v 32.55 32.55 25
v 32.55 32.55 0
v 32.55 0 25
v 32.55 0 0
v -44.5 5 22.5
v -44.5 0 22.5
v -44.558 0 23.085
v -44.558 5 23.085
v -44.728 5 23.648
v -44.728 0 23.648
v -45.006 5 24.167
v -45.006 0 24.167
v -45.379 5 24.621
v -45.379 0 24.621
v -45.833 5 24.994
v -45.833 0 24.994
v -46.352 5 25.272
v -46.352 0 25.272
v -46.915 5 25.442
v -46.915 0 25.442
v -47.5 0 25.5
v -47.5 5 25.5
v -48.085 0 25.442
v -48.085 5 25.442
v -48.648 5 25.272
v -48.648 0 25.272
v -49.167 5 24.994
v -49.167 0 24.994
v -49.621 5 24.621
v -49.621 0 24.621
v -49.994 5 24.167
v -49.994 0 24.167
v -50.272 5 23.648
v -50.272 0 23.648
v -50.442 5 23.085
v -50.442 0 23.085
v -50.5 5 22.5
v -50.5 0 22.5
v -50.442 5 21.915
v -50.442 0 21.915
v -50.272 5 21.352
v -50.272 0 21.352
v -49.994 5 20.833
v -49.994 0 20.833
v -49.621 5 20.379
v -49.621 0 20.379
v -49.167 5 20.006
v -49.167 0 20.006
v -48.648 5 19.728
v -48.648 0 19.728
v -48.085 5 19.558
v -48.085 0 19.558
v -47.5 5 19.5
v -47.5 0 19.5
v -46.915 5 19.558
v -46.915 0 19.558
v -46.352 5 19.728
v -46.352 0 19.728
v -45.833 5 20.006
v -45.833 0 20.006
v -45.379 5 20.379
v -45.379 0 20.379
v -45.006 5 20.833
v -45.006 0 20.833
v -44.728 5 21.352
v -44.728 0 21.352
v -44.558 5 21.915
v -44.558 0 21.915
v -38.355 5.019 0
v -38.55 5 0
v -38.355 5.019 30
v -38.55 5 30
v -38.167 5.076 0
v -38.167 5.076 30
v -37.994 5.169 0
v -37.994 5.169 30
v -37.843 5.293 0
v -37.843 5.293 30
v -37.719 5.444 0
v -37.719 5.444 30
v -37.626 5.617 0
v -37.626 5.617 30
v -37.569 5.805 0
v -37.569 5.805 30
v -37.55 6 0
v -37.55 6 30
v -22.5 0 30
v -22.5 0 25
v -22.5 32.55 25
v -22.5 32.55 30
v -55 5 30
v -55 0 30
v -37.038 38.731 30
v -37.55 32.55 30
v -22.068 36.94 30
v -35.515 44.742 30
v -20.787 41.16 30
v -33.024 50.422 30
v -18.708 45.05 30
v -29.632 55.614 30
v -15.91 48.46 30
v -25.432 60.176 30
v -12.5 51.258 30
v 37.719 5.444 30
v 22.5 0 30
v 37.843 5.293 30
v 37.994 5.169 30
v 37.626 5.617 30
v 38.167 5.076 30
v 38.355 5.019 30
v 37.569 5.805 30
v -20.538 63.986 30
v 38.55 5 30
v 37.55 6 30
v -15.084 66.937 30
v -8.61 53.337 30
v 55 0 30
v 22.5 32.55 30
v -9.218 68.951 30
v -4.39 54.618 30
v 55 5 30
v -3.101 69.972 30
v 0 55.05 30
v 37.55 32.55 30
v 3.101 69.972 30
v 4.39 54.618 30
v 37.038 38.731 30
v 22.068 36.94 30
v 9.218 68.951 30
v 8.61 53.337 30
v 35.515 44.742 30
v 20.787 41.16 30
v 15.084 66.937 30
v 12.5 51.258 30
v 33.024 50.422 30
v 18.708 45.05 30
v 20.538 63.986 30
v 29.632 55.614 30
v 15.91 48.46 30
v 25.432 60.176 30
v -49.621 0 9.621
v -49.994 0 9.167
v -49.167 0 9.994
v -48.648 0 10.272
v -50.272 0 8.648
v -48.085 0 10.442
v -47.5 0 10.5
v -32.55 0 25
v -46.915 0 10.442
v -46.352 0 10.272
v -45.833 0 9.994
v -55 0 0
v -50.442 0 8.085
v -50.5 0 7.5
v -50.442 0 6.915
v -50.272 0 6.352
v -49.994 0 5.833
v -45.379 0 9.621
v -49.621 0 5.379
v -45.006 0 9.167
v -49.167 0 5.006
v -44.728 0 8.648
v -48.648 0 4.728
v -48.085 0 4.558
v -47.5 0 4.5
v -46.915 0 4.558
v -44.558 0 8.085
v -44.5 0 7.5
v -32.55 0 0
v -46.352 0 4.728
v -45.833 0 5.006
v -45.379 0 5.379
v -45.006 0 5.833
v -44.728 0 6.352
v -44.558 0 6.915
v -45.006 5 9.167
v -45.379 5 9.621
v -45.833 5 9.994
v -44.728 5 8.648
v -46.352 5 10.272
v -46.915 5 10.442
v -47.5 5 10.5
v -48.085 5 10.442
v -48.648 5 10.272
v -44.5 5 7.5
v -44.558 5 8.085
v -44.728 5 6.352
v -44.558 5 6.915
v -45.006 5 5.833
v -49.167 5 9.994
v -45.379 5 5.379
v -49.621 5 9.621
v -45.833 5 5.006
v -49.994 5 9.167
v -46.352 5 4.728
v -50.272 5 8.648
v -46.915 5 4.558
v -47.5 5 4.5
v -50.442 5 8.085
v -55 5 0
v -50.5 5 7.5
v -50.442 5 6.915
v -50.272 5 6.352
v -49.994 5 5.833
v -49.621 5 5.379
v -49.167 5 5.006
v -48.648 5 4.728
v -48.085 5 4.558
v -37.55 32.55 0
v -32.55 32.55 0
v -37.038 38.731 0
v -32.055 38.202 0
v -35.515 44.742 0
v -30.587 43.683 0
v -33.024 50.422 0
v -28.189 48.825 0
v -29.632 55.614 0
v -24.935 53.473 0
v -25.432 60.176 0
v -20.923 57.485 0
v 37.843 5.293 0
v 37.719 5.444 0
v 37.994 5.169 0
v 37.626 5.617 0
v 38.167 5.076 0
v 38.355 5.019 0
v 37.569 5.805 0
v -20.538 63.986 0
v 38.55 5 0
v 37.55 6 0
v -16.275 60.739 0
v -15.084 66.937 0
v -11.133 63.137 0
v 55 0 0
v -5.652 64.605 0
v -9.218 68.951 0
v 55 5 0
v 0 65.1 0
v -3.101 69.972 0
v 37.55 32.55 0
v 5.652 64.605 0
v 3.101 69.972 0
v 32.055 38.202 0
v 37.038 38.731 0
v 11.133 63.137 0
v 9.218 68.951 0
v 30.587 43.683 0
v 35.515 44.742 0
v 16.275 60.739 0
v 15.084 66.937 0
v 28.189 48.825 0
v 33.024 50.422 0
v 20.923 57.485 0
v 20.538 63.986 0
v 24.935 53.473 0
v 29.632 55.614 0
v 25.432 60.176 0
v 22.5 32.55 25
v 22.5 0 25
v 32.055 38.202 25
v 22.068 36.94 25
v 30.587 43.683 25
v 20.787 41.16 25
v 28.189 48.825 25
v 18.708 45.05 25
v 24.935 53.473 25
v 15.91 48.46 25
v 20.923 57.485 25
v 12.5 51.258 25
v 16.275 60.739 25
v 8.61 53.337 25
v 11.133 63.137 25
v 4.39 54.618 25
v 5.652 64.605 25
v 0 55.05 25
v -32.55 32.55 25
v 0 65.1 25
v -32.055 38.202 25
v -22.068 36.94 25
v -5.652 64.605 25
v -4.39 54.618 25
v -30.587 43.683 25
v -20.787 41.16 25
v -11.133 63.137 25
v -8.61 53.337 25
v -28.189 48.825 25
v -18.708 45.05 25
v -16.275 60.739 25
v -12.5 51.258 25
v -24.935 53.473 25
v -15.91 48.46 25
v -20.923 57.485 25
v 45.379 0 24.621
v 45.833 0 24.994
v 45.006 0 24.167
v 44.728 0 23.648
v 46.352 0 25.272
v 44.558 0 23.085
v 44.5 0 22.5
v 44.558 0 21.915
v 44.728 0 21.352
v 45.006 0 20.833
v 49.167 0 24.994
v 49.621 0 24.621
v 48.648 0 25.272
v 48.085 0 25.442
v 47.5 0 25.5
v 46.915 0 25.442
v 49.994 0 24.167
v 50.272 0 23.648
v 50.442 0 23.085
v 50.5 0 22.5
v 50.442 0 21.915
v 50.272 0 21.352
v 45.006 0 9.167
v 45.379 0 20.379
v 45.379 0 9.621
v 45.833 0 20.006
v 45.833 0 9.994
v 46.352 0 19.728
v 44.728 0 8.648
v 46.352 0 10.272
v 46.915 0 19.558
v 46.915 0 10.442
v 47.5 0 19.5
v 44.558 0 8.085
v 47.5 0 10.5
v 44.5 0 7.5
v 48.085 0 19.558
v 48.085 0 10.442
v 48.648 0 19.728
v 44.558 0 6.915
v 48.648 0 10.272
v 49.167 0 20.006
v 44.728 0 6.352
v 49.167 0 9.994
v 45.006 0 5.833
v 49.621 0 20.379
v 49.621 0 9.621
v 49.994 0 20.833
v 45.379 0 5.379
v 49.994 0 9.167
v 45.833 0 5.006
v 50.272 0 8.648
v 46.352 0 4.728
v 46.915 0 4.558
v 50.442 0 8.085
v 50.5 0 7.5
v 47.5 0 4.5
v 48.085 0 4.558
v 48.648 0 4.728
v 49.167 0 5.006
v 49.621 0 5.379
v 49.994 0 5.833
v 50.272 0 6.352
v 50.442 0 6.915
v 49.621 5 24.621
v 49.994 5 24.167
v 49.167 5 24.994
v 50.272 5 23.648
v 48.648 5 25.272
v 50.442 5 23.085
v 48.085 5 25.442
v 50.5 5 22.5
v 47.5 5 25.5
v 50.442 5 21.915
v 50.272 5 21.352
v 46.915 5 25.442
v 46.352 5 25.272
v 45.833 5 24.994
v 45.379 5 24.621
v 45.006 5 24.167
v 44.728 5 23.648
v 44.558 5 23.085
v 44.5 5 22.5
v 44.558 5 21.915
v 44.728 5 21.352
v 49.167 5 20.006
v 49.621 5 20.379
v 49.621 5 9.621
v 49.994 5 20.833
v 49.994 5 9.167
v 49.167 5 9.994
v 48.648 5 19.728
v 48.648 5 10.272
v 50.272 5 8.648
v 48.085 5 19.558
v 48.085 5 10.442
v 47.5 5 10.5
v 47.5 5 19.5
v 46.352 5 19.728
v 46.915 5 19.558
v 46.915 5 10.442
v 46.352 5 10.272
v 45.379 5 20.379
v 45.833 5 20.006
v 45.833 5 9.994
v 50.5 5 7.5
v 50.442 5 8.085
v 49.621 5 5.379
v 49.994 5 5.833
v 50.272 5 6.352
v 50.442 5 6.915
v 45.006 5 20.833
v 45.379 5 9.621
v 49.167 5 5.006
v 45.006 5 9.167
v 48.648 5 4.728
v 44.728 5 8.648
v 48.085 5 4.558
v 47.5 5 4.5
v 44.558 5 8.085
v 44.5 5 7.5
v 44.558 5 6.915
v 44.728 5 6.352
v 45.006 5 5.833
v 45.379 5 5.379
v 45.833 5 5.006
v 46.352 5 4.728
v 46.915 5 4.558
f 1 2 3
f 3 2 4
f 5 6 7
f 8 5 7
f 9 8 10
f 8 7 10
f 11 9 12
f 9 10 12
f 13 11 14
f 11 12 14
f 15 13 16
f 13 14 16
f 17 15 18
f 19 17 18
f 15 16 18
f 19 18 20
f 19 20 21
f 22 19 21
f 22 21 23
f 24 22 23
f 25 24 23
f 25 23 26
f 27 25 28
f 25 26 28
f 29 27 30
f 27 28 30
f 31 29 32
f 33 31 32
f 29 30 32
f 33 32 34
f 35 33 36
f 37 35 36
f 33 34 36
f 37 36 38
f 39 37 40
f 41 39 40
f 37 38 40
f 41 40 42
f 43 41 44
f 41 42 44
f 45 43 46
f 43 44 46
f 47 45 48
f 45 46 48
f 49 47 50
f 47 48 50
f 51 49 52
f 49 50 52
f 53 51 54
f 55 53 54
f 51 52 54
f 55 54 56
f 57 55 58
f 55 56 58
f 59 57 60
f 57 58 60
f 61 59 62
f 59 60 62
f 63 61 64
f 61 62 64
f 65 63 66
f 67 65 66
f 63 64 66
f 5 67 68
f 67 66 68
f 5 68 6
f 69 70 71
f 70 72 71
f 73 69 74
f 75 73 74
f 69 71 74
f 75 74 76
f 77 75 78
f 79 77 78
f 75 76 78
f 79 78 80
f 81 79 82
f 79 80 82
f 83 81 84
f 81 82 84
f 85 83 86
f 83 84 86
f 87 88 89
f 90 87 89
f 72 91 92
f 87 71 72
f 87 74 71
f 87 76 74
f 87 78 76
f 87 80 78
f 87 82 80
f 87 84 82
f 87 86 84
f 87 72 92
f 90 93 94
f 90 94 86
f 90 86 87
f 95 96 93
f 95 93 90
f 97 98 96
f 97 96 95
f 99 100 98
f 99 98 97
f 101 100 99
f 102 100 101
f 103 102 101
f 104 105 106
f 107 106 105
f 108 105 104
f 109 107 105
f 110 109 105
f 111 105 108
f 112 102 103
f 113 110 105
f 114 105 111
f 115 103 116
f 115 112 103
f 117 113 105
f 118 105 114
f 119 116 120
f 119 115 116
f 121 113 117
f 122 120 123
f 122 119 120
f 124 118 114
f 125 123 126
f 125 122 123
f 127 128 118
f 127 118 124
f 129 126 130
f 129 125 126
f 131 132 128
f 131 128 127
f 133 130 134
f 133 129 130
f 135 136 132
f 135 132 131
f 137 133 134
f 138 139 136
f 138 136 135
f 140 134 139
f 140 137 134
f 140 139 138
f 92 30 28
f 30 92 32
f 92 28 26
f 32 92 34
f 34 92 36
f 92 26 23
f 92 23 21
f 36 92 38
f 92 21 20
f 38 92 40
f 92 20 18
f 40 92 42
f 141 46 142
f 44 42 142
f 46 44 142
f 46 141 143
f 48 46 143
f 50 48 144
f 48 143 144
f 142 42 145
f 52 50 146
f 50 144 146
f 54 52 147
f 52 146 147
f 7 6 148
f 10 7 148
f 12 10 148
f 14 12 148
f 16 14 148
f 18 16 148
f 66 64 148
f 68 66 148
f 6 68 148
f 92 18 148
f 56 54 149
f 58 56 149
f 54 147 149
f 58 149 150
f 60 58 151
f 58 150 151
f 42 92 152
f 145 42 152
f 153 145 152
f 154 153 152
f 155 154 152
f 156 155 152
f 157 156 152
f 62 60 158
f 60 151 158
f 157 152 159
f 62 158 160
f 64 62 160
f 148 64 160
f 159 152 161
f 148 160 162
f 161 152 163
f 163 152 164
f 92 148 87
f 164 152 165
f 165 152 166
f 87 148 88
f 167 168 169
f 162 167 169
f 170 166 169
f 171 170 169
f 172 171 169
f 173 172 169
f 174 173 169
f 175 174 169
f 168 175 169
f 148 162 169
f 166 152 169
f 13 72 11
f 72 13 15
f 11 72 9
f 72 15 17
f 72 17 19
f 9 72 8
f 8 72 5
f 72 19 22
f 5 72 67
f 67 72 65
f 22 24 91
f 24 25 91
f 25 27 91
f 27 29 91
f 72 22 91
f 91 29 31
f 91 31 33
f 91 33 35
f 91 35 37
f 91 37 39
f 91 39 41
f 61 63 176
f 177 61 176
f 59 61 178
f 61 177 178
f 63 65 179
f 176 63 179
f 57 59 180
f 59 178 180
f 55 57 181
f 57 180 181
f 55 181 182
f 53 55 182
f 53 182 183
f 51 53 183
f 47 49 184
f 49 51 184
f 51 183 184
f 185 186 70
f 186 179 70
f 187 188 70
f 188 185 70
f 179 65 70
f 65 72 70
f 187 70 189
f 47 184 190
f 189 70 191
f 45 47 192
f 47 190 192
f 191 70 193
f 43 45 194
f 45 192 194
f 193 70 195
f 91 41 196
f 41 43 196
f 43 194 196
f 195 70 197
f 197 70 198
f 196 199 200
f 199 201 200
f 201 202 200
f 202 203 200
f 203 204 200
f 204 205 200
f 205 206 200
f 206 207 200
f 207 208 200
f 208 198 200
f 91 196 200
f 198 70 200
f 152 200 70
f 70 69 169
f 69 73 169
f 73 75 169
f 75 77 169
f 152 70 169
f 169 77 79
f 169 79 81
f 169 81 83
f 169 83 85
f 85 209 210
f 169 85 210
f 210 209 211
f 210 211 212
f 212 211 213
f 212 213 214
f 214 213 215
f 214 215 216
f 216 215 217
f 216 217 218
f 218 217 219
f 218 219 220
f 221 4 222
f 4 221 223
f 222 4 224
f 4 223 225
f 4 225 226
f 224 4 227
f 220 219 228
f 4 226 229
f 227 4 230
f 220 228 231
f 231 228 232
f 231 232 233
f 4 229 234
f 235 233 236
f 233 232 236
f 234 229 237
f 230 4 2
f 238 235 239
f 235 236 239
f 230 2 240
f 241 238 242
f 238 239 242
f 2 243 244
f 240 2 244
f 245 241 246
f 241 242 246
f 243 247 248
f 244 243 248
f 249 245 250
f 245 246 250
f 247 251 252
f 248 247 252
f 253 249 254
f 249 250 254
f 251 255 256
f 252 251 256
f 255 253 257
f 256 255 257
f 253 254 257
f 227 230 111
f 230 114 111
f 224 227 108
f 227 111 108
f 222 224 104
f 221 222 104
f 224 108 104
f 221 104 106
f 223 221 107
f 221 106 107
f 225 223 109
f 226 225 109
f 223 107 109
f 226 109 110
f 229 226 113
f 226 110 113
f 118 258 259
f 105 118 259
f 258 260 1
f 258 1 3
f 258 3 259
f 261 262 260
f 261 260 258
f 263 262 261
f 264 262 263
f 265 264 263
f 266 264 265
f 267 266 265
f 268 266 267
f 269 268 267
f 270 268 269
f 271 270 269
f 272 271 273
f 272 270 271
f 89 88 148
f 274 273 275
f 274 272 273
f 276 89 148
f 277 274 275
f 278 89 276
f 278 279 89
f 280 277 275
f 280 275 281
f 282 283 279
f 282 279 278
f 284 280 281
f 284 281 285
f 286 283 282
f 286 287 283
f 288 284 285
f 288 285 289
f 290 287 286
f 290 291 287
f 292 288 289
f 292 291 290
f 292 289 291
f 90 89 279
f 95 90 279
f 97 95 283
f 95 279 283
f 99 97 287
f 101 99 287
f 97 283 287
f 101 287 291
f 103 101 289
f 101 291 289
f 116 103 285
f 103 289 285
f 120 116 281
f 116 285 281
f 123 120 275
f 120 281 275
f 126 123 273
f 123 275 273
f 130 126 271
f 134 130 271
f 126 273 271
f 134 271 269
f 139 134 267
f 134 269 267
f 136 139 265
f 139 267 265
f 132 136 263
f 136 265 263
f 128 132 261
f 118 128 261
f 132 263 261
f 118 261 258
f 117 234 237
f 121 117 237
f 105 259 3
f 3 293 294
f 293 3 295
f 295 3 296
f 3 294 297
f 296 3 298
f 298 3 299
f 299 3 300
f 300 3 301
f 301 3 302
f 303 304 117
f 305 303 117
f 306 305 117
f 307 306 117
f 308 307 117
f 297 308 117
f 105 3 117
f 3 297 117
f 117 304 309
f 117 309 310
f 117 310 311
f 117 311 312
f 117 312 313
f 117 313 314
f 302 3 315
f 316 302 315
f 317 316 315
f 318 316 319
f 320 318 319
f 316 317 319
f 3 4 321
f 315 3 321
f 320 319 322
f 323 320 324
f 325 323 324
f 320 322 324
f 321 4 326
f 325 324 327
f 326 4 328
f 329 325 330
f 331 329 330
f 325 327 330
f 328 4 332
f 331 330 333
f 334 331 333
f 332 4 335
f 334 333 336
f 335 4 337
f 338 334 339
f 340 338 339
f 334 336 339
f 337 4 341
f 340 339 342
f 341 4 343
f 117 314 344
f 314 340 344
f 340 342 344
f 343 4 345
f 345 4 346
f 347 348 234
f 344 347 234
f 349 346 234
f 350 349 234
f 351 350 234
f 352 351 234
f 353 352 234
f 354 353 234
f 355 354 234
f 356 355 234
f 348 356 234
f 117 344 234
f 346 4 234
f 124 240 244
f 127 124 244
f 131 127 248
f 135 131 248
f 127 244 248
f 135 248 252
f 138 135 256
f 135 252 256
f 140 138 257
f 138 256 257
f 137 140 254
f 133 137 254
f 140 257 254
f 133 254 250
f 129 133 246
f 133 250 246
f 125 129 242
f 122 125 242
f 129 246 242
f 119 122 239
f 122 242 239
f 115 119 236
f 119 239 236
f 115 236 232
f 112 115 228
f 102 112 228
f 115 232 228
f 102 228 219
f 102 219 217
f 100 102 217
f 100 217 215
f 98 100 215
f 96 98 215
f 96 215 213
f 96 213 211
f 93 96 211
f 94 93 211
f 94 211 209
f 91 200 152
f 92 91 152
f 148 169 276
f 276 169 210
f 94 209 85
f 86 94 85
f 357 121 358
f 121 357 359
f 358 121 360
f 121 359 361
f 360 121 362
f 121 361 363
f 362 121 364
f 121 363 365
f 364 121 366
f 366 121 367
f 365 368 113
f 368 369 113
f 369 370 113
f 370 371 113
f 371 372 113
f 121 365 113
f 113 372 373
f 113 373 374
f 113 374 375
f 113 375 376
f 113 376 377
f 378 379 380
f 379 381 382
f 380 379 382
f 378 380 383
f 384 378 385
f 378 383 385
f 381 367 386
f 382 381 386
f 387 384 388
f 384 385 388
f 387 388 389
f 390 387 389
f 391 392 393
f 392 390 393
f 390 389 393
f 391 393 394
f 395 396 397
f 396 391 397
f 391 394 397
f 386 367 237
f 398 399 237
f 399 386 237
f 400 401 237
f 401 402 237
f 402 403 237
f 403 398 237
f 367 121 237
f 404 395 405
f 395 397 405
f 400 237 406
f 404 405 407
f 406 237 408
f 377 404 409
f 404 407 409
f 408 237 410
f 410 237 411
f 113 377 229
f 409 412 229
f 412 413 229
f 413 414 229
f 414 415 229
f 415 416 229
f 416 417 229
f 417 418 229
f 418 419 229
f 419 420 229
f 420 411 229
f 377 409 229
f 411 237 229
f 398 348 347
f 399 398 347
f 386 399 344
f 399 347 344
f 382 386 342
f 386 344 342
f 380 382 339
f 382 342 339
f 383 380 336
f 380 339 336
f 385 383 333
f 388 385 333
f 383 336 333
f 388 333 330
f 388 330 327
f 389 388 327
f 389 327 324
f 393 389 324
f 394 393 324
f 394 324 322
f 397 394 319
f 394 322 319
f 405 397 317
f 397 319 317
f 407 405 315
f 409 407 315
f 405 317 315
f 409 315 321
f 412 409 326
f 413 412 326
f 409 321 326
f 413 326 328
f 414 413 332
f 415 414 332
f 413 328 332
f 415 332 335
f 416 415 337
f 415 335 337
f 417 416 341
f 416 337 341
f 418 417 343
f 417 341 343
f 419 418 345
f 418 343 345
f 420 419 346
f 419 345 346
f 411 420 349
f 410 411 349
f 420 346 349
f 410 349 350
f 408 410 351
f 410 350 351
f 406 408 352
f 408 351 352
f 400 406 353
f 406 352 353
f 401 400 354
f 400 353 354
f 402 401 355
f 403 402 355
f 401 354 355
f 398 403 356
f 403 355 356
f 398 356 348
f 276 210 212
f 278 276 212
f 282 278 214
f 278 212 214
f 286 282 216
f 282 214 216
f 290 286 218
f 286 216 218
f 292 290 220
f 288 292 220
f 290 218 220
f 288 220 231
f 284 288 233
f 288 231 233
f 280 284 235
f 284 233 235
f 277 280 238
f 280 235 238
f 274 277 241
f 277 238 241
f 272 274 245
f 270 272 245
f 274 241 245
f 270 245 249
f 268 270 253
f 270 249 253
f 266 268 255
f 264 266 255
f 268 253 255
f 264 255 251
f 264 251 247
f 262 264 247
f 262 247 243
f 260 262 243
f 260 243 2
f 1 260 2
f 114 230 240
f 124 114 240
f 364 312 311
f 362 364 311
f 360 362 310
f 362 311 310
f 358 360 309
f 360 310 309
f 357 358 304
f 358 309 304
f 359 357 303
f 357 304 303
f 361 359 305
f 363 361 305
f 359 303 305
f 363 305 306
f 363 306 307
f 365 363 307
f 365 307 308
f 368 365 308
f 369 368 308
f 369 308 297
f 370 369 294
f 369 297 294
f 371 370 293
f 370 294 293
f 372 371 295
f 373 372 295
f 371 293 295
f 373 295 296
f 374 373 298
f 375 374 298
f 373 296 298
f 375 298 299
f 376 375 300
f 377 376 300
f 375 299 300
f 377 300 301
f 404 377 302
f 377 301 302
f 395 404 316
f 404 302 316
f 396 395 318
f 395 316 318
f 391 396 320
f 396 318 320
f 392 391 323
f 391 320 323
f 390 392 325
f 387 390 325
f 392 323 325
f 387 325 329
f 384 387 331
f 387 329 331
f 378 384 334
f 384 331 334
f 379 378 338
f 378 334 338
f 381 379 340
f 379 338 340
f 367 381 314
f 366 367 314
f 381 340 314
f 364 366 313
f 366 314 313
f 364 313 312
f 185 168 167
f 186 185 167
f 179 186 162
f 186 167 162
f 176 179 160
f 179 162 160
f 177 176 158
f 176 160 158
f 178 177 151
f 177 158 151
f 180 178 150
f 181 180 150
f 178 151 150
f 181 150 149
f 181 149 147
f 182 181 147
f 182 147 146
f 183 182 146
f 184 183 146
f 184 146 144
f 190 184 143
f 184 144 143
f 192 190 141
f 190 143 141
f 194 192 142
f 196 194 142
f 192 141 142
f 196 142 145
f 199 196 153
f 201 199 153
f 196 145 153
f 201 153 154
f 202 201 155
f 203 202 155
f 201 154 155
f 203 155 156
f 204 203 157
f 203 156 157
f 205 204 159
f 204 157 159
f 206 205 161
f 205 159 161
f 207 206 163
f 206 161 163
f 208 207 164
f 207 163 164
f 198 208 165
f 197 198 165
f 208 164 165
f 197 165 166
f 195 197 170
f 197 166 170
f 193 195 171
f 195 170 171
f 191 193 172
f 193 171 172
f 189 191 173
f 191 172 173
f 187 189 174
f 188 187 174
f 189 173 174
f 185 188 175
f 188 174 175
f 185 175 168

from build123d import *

# Parameters (mm, degrees)
BOSS_EXTRU_1_DEPTH      = 30
ENL_V_MAT_EXTRU_1_DEPTH = 31
ENL_V_MAT_EXTRU_2_DEPTH = 25
ESQUISSE4_R             = 3
ENL_V_MAT_EXTRU_3_DEPTH = 5
CONG_1_R                = 1


with BuildPart() as part:
    # Esquisse1 → Boss.-Extru.1 (new body)
    with BuildSketch(Plane.XY):
        with BuildLine():
            Line((-55, 0), (55, 0))
            Line((55, 0), (55, 5))
            Line((55, 5), (37.55, 5))
            Line((37.55, 5), (37.55, 32.55))
            ThreePointArc((37.55, 32.55), (0, 70.1), (-37.55, 32.55))
            Line((-37.55, 32.55), (-37.55, 5))
            Line((-37.55, 5), (-55, 5))
            Line((-55, 5), (-55, 0))
        make_face()
    extrude(amount=BOSS_EXTRU_1_DEPTH)

    # Esquisse2 → Enlèv. mat.-Extru.1 (cut, through all)
    with BuildSketch(Plane(origin=(0, 0, 0), x_dir=(-1, 0, 0), z_dir=(0, 0, -1))):
        with BuildLine():
            Line((-22.5, 32.55), (-22.5, 0))
            Line((-22.5, 0), (22.5, 0))
            Line((22.5, 0), (22.5, 32.55))
            ThreePointArc((22.5, 32.55), (0, 55.05), (-22.5, 32.55))
        make_face()
    extrude(amount=-ENL_V_MAT_EXTRU_1_DEPTH, mode=Mode.SUBTRACT)

    # Esquisse3 → Enlèv. mat.-Extru.2 (cut)
    with BuildSketch(Plane(origin=(0, 0, 0), x_dir=(-1, 0, 0), z_dir=(0, 0, -1))):
        with BuildLine():
            Line((-32.55, 32.55), (-32.55, 0))
            Line((-32.55, 0), (32.55, 0))
            Line((32.55, 0), (32.55, 32.55))
            ThreePointArc((32.55, 32.55), (0, 65.1), (-32.55, 32.55))
        make_face()
    extrude(amount=-ENL_V_MAT_EXTRU_2_DEPTH, mode=Mode.SUBTRACT)

    # Esquisse4 → Enlèv. mat.-Extru.3 (cut)
    with BuildSketch(Plane.XZ):
        with Locations((47.5, 7.5)):
            Circle(ESQUISSE4_R)
        with Locations((-47.5, 7.5)):
            Circle(ESQUISSE4_R)
        with Locations((47.5, 22.5)):
            Circle(ESQUISSE4_R)
        with Locations((-47.5, 22.5)):
            Circle(ESQUISSE4_R)
    extrude(amount=-ENL_V_MAT_EXTRU_3_DEPTH, mode=Mode.SUBTRACT)

    # Congé1
    cong_1_edges = [part.edges().sort_by_distance(p)[0] for p in [
        (-37.55, 5, 15),
        (37.55, 5, 15),
    ]]
    fillet(cong_1_edges, radius=CONG_1_R)


solid = part.part
